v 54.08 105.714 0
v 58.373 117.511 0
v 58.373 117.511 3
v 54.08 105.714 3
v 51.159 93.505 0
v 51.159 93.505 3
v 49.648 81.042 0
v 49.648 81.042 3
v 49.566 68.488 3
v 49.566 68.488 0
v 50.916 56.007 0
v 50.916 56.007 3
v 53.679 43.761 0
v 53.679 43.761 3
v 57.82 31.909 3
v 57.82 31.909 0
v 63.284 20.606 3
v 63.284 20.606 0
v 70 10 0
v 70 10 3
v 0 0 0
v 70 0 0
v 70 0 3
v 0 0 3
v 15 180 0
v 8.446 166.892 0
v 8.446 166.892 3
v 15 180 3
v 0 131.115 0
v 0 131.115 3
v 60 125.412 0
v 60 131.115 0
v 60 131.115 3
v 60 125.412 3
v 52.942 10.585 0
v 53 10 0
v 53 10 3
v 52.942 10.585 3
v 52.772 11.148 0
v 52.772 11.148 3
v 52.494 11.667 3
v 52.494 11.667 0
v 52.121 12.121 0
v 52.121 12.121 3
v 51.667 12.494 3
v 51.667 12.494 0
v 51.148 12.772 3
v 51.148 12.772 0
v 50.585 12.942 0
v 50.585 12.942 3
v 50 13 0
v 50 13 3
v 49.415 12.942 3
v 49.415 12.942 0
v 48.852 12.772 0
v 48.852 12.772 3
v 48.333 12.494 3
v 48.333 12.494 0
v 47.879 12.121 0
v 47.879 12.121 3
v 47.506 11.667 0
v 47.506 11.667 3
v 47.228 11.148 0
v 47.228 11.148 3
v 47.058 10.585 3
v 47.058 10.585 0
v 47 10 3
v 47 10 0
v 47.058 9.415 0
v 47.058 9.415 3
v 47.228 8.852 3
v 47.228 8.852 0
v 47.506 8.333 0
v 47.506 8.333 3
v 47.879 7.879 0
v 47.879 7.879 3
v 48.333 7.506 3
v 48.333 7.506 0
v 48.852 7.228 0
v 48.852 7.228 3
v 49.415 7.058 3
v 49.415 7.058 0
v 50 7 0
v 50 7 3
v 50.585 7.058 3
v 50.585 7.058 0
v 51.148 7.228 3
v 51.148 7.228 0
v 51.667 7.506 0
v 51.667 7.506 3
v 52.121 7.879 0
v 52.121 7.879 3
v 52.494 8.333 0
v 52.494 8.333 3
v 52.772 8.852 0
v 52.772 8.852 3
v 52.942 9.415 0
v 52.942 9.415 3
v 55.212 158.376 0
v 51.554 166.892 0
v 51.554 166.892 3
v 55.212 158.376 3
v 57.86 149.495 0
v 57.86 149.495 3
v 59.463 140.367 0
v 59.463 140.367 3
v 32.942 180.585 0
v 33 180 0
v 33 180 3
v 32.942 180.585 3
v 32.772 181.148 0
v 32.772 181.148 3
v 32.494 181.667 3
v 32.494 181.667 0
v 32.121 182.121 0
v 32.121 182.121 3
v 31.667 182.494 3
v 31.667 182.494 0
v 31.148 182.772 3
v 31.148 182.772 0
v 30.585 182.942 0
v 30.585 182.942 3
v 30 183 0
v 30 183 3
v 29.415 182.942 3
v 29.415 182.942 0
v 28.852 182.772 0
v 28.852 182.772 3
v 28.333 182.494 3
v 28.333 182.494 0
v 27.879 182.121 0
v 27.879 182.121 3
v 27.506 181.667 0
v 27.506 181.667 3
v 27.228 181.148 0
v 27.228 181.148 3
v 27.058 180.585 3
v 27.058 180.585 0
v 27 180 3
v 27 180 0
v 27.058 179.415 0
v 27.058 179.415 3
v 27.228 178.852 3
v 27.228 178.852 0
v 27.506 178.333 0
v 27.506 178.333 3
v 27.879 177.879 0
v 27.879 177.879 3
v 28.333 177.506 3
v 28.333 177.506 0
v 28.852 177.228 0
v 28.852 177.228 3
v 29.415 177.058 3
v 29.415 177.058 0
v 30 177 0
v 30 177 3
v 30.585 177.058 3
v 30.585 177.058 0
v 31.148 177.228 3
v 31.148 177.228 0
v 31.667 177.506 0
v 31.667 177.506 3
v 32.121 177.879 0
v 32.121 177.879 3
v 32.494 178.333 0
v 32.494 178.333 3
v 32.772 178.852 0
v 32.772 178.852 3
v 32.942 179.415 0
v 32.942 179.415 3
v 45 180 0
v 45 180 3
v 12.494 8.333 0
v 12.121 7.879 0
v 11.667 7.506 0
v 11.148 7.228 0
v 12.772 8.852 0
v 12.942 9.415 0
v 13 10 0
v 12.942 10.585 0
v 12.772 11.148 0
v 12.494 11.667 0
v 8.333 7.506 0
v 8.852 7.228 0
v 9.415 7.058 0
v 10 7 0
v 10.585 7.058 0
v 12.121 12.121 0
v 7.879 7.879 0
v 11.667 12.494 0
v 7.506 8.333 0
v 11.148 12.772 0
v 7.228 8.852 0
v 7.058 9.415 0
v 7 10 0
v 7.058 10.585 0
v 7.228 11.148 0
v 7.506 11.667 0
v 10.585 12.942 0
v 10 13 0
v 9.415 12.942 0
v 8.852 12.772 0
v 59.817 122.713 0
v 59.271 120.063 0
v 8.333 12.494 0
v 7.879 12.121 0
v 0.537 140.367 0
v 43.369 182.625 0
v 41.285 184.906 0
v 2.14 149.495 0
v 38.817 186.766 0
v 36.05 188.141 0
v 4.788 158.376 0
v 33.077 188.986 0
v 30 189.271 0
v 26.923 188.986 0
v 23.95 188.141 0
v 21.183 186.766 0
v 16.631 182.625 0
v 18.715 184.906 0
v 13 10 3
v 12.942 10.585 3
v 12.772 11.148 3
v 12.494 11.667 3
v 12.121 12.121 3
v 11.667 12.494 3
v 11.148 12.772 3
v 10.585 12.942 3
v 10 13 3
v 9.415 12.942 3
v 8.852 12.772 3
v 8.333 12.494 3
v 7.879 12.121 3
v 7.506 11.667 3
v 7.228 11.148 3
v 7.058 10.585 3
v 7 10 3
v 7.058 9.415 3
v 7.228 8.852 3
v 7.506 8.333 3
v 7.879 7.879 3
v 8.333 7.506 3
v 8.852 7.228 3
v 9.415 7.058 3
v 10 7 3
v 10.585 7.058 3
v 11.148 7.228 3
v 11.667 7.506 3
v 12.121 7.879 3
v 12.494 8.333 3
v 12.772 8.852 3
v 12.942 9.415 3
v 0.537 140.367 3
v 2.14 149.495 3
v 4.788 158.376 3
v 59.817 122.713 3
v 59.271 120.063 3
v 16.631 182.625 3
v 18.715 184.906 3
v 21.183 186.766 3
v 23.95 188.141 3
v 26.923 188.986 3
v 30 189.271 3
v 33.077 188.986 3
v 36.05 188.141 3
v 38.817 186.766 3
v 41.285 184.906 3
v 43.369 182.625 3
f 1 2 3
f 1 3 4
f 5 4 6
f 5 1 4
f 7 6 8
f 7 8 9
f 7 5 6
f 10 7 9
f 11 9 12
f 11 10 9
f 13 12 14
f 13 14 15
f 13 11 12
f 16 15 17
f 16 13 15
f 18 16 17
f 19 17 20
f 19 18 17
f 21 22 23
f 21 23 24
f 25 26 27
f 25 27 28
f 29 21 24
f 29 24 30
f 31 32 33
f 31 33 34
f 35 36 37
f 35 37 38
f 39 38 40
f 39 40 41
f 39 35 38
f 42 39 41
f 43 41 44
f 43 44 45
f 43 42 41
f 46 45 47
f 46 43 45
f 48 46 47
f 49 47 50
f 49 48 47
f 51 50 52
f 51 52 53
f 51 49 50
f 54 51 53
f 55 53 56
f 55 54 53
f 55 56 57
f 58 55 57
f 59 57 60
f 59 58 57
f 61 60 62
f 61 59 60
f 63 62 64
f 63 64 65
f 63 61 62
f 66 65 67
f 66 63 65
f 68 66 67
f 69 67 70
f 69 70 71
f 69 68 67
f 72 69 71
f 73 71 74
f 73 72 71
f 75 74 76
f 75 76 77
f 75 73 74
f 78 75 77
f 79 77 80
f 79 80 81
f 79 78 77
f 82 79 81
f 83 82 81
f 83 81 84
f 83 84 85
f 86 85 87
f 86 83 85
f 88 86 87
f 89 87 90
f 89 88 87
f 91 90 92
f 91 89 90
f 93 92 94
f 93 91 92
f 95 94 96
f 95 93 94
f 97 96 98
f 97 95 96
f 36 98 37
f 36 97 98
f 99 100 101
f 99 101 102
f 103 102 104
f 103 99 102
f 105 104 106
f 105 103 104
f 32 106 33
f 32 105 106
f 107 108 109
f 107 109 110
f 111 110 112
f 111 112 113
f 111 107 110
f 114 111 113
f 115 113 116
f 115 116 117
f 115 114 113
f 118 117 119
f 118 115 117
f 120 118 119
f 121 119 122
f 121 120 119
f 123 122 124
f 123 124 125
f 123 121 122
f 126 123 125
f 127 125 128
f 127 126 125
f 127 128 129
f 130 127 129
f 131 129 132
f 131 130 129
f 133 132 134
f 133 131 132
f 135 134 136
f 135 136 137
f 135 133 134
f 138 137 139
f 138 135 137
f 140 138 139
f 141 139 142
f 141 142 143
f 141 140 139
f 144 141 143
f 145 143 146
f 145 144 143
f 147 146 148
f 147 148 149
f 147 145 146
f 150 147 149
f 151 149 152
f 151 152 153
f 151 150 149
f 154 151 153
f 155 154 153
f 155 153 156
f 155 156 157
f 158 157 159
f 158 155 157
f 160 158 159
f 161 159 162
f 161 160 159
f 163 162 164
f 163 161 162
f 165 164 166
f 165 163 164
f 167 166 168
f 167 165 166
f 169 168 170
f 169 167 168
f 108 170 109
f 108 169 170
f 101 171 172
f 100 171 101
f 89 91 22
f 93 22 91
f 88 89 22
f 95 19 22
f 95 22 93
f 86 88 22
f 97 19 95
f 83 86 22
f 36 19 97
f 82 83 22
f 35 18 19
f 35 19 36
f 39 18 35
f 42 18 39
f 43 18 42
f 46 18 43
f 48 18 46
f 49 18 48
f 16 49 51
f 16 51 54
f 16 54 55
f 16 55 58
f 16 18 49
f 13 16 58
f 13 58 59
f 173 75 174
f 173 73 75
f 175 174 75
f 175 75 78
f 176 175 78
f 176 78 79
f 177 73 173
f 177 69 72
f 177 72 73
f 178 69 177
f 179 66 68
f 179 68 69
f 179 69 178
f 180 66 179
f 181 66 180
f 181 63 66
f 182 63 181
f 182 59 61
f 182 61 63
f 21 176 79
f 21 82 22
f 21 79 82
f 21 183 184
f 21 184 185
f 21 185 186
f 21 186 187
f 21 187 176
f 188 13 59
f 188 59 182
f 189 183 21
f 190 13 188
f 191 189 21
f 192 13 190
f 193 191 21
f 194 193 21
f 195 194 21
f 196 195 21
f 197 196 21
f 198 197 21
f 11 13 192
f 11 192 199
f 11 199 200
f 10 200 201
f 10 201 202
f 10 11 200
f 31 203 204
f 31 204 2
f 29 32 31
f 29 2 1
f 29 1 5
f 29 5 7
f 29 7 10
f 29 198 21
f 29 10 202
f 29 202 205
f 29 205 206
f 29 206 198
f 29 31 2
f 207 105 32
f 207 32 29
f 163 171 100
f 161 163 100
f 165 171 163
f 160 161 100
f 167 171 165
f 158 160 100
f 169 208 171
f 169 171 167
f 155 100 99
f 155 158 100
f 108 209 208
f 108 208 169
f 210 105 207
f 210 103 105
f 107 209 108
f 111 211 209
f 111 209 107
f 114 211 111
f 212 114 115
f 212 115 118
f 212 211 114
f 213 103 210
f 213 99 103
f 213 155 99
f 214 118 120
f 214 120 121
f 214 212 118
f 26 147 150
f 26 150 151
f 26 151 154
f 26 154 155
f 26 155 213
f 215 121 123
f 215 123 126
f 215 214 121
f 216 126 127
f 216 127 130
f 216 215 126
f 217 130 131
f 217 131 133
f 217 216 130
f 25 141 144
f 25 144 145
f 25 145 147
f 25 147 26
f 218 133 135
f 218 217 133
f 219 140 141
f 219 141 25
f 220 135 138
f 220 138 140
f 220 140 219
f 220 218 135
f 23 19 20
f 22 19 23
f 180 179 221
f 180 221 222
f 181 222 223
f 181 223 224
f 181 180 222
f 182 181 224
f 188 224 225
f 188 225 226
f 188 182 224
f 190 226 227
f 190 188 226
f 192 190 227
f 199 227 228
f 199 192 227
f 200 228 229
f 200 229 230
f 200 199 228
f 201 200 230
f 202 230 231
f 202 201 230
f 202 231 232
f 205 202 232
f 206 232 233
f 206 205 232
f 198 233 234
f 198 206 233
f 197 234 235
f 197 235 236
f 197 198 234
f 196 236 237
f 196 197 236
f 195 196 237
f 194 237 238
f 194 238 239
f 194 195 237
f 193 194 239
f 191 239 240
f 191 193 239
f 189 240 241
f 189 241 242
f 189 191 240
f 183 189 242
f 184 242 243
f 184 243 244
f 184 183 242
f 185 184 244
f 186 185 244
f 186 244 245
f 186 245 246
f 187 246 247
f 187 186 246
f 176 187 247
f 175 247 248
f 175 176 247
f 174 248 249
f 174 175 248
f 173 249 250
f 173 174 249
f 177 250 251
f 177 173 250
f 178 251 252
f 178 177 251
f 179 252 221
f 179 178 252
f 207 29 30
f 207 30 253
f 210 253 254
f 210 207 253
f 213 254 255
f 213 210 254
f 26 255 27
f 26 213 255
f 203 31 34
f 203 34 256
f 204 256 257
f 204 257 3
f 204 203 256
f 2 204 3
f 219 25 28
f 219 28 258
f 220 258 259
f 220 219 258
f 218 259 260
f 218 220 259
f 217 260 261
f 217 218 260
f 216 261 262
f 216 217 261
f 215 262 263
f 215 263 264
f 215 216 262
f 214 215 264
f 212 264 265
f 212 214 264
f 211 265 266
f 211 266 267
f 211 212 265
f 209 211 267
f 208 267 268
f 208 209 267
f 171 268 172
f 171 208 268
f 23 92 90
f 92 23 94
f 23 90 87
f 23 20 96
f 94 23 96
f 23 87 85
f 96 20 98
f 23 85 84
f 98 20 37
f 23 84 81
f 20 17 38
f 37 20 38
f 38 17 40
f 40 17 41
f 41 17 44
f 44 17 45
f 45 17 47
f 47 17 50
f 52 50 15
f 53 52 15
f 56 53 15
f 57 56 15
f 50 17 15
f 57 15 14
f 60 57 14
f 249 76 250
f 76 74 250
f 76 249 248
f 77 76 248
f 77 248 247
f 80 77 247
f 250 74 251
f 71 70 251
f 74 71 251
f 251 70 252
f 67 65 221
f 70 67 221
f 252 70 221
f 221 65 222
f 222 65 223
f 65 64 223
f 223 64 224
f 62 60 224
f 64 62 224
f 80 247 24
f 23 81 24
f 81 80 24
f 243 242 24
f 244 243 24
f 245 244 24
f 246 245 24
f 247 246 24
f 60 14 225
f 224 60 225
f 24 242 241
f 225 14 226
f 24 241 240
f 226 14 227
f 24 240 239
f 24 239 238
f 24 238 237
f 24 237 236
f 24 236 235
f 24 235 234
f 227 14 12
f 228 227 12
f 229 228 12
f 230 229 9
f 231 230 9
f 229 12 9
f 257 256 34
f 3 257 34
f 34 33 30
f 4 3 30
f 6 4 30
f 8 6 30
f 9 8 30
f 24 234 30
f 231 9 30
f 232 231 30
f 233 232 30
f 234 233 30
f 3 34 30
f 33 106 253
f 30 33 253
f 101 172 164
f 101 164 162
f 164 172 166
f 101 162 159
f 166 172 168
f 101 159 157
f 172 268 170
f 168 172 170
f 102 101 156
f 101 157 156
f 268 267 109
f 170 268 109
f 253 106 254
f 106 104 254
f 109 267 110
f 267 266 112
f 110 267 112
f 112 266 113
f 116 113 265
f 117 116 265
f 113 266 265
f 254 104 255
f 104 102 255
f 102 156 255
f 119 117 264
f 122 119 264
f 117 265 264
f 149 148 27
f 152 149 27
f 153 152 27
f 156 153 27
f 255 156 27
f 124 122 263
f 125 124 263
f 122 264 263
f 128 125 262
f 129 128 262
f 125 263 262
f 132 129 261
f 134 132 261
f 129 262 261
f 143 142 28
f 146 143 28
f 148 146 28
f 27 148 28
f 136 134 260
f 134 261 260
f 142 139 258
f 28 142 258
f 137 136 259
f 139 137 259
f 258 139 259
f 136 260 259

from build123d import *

# Parameters (mm, degrees)
SKETCH_1_R      = 3
EXTRUDE_1_DEPTH = 3


with BuildPart() as part:
    # 草图1 → 凸台-拉伸1 (new body)
    with BuildSketch(Plane.XY):
        with BuildLine():
            Line((8.44582472, 166.89164944), (15, 180))
            ThreePointArc((15, 180), (30, 189.270509831), (45, 180))
            Line((45, 180), (51.55417528, 166.89164944))
            ThreePointArc((51.55417528, 166.89164944), (57.859919157, 149.494795444), (60, 131.1145618))
            Line((60, 131.1145618), (60, 125.412430481))
            ThreePointArc((60, 125.412430481), (59.589066182, 121.379009336), (58.373151387, 117.511335106))
            ThreePointArc((58.373151387, 117.511335106), (50.063143822, 62.228284379), (70, 10))
            Line((70, 10), (70, 0))
            Line((70, 0), (60, 0))
            Line((60, 0), (0, 0))
            Line((0, 0), (0, 10))
            Line((0, 10), (0, 131.1145618))
            ThreePointArc((0, 131.1145618), (2.140080843, 149.494795444), (8.44582472, 166.89164944))
        make_face()
        with Locations((10, 10)):
            Circle(SKETCH_1_R, mode=Mode.SUBTRACT)
        with Locations((50, 10)):
            Circle(SKETCH_1_R, mode=Mode.SUBTRACT)
        with Locations((30, 180)):
            Circle(SKETCH_1_R, mode=Mode.SUBTRACT)
    extrude(amount=EXTRUDE_1_DEPTH)


solid = part.part
